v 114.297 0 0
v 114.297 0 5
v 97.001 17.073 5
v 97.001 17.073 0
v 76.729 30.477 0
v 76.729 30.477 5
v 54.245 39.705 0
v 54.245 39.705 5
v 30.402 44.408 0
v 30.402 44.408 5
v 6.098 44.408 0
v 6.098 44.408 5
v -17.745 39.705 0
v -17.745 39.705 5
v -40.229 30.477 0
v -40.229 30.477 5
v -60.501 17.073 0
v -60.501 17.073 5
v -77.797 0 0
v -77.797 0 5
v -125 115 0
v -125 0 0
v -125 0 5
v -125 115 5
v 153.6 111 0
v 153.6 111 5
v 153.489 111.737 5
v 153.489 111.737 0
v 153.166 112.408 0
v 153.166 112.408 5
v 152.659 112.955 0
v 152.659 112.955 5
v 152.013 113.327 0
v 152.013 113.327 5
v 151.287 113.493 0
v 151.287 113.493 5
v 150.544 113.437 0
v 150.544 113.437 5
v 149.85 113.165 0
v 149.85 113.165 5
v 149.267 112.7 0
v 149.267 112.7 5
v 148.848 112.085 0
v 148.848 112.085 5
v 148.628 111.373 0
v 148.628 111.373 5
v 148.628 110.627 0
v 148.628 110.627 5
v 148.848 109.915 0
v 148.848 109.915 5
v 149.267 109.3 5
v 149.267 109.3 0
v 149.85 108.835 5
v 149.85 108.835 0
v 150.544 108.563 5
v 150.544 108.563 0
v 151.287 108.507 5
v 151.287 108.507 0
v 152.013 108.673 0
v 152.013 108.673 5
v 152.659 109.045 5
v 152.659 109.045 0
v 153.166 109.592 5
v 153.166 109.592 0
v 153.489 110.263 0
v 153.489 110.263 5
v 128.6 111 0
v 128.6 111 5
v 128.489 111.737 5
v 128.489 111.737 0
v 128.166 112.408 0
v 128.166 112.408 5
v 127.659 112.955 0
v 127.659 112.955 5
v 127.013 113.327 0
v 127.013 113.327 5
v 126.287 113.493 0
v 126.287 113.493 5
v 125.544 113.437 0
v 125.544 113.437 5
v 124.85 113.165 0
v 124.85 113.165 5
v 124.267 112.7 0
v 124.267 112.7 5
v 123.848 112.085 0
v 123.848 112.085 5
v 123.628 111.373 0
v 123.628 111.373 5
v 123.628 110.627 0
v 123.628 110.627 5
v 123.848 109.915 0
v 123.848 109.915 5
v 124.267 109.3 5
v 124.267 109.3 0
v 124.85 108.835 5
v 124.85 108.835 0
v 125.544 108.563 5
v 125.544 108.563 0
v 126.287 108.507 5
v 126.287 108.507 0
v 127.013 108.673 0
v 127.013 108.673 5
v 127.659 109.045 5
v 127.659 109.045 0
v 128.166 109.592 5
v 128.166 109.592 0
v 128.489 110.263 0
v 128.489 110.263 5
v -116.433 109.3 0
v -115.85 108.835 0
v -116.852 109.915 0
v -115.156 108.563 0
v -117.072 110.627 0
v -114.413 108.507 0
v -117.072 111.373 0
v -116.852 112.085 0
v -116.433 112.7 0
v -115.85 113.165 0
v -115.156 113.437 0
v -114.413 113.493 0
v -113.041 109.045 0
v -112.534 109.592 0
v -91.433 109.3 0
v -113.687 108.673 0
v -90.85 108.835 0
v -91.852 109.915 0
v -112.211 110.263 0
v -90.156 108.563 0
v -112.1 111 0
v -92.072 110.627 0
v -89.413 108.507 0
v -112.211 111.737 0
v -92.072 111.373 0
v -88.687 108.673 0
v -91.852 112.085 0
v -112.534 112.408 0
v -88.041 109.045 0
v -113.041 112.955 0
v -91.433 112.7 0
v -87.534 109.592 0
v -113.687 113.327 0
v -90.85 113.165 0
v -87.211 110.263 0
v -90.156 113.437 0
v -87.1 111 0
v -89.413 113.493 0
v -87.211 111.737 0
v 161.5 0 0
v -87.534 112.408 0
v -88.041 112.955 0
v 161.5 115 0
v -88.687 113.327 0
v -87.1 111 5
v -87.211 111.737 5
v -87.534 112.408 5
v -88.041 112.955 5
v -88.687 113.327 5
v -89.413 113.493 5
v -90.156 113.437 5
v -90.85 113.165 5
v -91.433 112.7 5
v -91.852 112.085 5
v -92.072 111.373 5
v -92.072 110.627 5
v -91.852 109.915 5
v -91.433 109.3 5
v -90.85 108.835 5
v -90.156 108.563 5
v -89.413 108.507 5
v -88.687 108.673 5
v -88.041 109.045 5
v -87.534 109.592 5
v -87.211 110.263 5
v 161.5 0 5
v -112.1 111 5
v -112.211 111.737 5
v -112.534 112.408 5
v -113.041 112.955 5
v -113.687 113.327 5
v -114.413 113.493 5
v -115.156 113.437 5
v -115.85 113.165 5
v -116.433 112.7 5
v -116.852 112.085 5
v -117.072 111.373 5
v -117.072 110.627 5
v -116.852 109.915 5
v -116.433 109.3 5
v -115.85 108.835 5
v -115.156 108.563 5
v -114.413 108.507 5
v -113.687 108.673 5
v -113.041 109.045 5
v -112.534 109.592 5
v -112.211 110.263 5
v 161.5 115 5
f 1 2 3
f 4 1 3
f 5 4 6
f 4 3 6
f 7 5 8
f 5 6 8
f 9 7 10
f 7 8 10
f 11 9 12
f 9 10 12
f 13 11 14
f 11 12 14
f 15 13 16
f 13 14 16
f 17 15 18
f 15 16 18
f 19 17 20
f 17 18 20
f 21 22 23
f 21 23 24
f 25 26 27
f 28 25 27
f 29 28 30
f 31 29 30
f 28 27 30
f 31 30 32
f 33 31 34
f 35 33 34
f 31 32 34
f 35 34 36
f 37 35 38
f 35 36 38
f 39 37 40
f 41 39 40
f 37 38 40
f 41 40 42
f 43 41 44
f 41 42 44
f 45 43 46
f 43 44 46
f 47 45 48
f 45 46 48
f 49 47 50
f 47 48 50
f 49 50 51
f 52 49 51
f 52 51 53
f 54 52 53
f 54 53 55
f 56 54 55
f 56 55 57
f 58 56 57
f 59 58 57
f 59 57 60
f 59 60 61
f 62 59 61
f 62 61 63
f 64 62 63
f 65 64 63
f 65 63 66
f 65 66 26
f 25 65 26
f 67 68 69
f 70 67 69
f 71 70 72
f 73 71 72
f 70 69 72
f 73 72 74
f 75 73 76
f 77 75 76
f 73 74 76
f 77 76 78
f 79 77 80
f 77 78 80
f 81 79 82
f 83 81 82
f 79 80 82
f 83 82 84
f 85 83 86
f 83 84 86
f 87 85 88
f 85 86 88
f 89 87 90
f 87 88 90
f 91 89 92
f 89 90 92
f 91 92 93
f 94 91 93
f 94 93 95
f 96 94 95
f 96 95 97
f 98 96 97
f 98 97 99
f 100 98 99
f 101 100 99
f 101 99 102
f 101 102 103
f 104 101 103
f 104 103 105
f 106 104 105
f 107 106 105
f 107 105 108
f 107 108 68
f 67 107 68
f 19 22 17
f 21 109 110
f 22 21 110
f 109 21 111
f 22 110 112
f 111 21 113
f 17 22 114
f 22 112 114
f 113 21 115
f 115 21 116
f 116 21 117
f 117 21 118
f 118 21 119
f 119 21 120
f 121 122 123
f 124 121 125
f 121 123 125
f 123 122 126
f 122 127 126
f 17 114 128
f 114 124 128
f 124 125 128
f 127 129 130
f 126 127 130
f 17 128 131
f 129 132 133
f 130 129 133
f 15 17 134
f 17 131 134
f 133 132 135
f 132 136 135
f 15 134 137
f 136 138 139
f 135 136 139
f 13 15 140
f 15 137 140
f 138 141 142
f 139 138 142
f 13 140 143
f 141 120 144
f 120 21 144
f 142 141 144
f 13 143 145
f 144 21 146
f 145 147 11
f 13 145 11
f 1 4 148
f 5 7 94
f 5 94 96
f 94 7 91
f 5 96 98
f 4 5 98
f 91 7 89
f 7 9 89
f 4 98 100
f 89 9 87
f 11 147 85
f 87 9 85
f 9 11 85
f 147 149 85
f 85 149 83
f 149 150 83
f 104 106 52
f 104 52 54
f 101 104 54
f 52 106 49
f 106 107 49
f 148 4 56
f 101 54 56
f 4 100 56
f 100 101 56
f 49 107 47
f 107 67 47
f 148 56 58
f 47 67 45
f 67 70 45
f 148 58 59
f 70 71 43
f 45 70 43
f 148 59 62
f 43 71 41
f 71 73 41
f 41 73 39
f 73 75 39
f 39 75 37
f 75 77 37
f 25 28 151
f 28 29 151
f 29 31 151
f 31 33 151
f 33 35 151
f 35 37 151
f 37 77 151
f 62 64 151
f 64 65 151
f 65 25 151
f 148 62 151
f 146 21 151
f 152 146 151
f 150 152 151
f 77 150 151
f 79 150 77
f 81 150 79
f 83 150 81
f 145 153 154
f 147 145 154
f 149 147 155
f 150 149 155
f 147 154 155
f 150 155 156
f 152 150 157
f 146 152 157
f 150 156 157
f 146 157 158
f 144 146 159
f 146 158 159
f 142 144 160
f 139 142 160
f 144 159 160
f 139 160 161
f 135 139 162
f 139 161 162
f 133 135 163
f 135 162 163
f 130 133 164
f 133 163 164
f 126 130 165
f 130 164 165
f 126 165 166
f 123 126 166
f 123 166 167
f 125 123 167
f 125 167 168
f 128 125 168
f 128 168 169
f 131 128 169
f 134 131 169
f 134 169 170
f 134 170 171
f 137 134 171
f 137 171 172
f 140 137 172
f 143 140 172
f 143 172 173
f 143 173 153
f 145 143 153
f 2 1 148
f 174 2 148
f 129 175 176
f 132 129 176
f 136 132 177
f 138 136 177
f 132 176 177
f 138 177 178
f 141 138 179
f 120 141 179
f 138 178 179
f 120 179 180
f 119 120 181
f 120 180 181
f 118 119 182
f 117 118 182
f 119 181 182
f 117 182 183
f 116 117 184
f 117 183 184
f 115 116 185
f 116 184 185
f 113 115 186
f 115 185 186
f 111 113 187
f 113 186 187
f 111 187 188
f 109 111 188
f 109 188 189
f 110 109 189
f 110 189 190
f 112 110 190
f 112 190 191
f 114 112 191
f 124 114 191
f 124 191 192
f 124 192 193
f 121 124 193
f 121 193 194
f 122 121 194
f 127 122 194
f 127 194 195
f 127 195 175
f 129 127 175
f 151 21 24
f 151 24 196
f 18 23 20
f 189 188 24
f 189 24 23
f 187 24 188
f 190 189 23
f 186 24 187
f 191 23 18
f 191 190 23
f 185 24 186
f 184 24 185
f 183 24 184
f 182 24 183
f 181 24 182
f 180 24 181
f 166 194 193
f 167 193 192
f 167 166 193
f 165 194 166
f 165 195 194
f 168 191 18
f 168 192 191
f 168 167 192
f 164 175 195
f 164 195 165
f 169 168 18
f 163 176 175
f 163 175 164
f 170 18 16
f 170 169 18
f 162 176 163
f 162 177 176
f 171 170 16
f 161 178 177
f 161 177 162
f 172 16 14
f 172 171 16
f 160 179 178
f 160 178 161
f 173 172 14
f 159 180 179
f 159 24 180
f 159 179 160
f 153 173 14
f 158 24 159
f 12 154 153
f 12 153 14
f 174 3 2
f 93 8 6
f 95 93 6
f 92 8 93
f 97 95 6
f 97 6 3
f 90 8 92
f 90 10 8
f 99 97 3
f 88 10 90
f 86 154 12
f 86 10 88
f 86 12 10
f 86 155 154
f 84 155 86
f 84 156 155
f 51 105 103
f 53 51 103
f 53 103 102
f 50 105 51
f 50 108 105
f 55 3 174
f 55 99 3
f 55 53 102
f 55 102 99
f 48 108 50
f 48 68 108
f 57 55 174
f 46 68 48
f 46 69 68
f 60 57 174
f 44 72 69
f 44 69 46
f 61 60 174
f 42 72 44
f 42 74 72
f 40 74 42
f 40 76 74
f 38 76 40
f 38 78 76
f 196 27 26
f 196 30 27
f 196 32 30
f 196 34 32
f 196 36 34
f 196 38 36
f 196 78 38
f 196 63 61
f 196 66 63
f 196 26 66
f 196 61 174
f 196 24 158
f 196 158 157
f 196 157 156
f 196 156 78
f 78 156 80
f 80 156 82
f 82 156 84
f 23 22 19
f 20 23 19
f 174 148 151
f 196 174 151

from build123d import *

# Parameters (mm, degrees)
SKETCH6_W           = 286.5
SKETCH6_H           = 115
BOSS_EXTRUDE3_DEPTH = 5
SKETCH7_R           = 2.5
CUT_EXTRUDE1_DEPTH  = 13
SKETCH8_R           = 125
CUT_EXTRUDE4_DEPTH  = 10


with BuildPart() as part:
    # Sketch6 → Boss-Extrude3 (new body)
    with BuildSketch(Plane.XY):
        with Locations((18.25, 57.5)):
            Rectangle(SKETCH6_W, SKETCH6_H)
    extrude(amount=BOSS_EXTRUDE3_DEPTH)

    # Sketch7 → Cut-Extrude1 (cut)
    with BuildSketch(Plane.XY.offset(5)):
        with Locations((151.1, 111)):
            Circle(SKETCH7_R)
        with Locations((126.1, 111)):
            Circle(SKETCH7_R)
        with Locations((-114.6, 111)):
            Circle(SKETCH7_R)
        with Locations((-89.6, 111)):
            Circle(SKETCH7_R)
    extrude(amount=-CUT_EXTRUDE1_DEPTH, mode=Mode.SUBTRACT)

    # Sketch8 → Cut-Extrude4 (cut)
    with BuildSketch(Plane.XY.offset(5)):
        with Locations((18.25, -80)):
            Circle(SKETCH8_R)
    extrude(amount=-CUT_EXTRUDE4_DEPTH, mode=Mode.SUBTRACT)


solid = part.part
